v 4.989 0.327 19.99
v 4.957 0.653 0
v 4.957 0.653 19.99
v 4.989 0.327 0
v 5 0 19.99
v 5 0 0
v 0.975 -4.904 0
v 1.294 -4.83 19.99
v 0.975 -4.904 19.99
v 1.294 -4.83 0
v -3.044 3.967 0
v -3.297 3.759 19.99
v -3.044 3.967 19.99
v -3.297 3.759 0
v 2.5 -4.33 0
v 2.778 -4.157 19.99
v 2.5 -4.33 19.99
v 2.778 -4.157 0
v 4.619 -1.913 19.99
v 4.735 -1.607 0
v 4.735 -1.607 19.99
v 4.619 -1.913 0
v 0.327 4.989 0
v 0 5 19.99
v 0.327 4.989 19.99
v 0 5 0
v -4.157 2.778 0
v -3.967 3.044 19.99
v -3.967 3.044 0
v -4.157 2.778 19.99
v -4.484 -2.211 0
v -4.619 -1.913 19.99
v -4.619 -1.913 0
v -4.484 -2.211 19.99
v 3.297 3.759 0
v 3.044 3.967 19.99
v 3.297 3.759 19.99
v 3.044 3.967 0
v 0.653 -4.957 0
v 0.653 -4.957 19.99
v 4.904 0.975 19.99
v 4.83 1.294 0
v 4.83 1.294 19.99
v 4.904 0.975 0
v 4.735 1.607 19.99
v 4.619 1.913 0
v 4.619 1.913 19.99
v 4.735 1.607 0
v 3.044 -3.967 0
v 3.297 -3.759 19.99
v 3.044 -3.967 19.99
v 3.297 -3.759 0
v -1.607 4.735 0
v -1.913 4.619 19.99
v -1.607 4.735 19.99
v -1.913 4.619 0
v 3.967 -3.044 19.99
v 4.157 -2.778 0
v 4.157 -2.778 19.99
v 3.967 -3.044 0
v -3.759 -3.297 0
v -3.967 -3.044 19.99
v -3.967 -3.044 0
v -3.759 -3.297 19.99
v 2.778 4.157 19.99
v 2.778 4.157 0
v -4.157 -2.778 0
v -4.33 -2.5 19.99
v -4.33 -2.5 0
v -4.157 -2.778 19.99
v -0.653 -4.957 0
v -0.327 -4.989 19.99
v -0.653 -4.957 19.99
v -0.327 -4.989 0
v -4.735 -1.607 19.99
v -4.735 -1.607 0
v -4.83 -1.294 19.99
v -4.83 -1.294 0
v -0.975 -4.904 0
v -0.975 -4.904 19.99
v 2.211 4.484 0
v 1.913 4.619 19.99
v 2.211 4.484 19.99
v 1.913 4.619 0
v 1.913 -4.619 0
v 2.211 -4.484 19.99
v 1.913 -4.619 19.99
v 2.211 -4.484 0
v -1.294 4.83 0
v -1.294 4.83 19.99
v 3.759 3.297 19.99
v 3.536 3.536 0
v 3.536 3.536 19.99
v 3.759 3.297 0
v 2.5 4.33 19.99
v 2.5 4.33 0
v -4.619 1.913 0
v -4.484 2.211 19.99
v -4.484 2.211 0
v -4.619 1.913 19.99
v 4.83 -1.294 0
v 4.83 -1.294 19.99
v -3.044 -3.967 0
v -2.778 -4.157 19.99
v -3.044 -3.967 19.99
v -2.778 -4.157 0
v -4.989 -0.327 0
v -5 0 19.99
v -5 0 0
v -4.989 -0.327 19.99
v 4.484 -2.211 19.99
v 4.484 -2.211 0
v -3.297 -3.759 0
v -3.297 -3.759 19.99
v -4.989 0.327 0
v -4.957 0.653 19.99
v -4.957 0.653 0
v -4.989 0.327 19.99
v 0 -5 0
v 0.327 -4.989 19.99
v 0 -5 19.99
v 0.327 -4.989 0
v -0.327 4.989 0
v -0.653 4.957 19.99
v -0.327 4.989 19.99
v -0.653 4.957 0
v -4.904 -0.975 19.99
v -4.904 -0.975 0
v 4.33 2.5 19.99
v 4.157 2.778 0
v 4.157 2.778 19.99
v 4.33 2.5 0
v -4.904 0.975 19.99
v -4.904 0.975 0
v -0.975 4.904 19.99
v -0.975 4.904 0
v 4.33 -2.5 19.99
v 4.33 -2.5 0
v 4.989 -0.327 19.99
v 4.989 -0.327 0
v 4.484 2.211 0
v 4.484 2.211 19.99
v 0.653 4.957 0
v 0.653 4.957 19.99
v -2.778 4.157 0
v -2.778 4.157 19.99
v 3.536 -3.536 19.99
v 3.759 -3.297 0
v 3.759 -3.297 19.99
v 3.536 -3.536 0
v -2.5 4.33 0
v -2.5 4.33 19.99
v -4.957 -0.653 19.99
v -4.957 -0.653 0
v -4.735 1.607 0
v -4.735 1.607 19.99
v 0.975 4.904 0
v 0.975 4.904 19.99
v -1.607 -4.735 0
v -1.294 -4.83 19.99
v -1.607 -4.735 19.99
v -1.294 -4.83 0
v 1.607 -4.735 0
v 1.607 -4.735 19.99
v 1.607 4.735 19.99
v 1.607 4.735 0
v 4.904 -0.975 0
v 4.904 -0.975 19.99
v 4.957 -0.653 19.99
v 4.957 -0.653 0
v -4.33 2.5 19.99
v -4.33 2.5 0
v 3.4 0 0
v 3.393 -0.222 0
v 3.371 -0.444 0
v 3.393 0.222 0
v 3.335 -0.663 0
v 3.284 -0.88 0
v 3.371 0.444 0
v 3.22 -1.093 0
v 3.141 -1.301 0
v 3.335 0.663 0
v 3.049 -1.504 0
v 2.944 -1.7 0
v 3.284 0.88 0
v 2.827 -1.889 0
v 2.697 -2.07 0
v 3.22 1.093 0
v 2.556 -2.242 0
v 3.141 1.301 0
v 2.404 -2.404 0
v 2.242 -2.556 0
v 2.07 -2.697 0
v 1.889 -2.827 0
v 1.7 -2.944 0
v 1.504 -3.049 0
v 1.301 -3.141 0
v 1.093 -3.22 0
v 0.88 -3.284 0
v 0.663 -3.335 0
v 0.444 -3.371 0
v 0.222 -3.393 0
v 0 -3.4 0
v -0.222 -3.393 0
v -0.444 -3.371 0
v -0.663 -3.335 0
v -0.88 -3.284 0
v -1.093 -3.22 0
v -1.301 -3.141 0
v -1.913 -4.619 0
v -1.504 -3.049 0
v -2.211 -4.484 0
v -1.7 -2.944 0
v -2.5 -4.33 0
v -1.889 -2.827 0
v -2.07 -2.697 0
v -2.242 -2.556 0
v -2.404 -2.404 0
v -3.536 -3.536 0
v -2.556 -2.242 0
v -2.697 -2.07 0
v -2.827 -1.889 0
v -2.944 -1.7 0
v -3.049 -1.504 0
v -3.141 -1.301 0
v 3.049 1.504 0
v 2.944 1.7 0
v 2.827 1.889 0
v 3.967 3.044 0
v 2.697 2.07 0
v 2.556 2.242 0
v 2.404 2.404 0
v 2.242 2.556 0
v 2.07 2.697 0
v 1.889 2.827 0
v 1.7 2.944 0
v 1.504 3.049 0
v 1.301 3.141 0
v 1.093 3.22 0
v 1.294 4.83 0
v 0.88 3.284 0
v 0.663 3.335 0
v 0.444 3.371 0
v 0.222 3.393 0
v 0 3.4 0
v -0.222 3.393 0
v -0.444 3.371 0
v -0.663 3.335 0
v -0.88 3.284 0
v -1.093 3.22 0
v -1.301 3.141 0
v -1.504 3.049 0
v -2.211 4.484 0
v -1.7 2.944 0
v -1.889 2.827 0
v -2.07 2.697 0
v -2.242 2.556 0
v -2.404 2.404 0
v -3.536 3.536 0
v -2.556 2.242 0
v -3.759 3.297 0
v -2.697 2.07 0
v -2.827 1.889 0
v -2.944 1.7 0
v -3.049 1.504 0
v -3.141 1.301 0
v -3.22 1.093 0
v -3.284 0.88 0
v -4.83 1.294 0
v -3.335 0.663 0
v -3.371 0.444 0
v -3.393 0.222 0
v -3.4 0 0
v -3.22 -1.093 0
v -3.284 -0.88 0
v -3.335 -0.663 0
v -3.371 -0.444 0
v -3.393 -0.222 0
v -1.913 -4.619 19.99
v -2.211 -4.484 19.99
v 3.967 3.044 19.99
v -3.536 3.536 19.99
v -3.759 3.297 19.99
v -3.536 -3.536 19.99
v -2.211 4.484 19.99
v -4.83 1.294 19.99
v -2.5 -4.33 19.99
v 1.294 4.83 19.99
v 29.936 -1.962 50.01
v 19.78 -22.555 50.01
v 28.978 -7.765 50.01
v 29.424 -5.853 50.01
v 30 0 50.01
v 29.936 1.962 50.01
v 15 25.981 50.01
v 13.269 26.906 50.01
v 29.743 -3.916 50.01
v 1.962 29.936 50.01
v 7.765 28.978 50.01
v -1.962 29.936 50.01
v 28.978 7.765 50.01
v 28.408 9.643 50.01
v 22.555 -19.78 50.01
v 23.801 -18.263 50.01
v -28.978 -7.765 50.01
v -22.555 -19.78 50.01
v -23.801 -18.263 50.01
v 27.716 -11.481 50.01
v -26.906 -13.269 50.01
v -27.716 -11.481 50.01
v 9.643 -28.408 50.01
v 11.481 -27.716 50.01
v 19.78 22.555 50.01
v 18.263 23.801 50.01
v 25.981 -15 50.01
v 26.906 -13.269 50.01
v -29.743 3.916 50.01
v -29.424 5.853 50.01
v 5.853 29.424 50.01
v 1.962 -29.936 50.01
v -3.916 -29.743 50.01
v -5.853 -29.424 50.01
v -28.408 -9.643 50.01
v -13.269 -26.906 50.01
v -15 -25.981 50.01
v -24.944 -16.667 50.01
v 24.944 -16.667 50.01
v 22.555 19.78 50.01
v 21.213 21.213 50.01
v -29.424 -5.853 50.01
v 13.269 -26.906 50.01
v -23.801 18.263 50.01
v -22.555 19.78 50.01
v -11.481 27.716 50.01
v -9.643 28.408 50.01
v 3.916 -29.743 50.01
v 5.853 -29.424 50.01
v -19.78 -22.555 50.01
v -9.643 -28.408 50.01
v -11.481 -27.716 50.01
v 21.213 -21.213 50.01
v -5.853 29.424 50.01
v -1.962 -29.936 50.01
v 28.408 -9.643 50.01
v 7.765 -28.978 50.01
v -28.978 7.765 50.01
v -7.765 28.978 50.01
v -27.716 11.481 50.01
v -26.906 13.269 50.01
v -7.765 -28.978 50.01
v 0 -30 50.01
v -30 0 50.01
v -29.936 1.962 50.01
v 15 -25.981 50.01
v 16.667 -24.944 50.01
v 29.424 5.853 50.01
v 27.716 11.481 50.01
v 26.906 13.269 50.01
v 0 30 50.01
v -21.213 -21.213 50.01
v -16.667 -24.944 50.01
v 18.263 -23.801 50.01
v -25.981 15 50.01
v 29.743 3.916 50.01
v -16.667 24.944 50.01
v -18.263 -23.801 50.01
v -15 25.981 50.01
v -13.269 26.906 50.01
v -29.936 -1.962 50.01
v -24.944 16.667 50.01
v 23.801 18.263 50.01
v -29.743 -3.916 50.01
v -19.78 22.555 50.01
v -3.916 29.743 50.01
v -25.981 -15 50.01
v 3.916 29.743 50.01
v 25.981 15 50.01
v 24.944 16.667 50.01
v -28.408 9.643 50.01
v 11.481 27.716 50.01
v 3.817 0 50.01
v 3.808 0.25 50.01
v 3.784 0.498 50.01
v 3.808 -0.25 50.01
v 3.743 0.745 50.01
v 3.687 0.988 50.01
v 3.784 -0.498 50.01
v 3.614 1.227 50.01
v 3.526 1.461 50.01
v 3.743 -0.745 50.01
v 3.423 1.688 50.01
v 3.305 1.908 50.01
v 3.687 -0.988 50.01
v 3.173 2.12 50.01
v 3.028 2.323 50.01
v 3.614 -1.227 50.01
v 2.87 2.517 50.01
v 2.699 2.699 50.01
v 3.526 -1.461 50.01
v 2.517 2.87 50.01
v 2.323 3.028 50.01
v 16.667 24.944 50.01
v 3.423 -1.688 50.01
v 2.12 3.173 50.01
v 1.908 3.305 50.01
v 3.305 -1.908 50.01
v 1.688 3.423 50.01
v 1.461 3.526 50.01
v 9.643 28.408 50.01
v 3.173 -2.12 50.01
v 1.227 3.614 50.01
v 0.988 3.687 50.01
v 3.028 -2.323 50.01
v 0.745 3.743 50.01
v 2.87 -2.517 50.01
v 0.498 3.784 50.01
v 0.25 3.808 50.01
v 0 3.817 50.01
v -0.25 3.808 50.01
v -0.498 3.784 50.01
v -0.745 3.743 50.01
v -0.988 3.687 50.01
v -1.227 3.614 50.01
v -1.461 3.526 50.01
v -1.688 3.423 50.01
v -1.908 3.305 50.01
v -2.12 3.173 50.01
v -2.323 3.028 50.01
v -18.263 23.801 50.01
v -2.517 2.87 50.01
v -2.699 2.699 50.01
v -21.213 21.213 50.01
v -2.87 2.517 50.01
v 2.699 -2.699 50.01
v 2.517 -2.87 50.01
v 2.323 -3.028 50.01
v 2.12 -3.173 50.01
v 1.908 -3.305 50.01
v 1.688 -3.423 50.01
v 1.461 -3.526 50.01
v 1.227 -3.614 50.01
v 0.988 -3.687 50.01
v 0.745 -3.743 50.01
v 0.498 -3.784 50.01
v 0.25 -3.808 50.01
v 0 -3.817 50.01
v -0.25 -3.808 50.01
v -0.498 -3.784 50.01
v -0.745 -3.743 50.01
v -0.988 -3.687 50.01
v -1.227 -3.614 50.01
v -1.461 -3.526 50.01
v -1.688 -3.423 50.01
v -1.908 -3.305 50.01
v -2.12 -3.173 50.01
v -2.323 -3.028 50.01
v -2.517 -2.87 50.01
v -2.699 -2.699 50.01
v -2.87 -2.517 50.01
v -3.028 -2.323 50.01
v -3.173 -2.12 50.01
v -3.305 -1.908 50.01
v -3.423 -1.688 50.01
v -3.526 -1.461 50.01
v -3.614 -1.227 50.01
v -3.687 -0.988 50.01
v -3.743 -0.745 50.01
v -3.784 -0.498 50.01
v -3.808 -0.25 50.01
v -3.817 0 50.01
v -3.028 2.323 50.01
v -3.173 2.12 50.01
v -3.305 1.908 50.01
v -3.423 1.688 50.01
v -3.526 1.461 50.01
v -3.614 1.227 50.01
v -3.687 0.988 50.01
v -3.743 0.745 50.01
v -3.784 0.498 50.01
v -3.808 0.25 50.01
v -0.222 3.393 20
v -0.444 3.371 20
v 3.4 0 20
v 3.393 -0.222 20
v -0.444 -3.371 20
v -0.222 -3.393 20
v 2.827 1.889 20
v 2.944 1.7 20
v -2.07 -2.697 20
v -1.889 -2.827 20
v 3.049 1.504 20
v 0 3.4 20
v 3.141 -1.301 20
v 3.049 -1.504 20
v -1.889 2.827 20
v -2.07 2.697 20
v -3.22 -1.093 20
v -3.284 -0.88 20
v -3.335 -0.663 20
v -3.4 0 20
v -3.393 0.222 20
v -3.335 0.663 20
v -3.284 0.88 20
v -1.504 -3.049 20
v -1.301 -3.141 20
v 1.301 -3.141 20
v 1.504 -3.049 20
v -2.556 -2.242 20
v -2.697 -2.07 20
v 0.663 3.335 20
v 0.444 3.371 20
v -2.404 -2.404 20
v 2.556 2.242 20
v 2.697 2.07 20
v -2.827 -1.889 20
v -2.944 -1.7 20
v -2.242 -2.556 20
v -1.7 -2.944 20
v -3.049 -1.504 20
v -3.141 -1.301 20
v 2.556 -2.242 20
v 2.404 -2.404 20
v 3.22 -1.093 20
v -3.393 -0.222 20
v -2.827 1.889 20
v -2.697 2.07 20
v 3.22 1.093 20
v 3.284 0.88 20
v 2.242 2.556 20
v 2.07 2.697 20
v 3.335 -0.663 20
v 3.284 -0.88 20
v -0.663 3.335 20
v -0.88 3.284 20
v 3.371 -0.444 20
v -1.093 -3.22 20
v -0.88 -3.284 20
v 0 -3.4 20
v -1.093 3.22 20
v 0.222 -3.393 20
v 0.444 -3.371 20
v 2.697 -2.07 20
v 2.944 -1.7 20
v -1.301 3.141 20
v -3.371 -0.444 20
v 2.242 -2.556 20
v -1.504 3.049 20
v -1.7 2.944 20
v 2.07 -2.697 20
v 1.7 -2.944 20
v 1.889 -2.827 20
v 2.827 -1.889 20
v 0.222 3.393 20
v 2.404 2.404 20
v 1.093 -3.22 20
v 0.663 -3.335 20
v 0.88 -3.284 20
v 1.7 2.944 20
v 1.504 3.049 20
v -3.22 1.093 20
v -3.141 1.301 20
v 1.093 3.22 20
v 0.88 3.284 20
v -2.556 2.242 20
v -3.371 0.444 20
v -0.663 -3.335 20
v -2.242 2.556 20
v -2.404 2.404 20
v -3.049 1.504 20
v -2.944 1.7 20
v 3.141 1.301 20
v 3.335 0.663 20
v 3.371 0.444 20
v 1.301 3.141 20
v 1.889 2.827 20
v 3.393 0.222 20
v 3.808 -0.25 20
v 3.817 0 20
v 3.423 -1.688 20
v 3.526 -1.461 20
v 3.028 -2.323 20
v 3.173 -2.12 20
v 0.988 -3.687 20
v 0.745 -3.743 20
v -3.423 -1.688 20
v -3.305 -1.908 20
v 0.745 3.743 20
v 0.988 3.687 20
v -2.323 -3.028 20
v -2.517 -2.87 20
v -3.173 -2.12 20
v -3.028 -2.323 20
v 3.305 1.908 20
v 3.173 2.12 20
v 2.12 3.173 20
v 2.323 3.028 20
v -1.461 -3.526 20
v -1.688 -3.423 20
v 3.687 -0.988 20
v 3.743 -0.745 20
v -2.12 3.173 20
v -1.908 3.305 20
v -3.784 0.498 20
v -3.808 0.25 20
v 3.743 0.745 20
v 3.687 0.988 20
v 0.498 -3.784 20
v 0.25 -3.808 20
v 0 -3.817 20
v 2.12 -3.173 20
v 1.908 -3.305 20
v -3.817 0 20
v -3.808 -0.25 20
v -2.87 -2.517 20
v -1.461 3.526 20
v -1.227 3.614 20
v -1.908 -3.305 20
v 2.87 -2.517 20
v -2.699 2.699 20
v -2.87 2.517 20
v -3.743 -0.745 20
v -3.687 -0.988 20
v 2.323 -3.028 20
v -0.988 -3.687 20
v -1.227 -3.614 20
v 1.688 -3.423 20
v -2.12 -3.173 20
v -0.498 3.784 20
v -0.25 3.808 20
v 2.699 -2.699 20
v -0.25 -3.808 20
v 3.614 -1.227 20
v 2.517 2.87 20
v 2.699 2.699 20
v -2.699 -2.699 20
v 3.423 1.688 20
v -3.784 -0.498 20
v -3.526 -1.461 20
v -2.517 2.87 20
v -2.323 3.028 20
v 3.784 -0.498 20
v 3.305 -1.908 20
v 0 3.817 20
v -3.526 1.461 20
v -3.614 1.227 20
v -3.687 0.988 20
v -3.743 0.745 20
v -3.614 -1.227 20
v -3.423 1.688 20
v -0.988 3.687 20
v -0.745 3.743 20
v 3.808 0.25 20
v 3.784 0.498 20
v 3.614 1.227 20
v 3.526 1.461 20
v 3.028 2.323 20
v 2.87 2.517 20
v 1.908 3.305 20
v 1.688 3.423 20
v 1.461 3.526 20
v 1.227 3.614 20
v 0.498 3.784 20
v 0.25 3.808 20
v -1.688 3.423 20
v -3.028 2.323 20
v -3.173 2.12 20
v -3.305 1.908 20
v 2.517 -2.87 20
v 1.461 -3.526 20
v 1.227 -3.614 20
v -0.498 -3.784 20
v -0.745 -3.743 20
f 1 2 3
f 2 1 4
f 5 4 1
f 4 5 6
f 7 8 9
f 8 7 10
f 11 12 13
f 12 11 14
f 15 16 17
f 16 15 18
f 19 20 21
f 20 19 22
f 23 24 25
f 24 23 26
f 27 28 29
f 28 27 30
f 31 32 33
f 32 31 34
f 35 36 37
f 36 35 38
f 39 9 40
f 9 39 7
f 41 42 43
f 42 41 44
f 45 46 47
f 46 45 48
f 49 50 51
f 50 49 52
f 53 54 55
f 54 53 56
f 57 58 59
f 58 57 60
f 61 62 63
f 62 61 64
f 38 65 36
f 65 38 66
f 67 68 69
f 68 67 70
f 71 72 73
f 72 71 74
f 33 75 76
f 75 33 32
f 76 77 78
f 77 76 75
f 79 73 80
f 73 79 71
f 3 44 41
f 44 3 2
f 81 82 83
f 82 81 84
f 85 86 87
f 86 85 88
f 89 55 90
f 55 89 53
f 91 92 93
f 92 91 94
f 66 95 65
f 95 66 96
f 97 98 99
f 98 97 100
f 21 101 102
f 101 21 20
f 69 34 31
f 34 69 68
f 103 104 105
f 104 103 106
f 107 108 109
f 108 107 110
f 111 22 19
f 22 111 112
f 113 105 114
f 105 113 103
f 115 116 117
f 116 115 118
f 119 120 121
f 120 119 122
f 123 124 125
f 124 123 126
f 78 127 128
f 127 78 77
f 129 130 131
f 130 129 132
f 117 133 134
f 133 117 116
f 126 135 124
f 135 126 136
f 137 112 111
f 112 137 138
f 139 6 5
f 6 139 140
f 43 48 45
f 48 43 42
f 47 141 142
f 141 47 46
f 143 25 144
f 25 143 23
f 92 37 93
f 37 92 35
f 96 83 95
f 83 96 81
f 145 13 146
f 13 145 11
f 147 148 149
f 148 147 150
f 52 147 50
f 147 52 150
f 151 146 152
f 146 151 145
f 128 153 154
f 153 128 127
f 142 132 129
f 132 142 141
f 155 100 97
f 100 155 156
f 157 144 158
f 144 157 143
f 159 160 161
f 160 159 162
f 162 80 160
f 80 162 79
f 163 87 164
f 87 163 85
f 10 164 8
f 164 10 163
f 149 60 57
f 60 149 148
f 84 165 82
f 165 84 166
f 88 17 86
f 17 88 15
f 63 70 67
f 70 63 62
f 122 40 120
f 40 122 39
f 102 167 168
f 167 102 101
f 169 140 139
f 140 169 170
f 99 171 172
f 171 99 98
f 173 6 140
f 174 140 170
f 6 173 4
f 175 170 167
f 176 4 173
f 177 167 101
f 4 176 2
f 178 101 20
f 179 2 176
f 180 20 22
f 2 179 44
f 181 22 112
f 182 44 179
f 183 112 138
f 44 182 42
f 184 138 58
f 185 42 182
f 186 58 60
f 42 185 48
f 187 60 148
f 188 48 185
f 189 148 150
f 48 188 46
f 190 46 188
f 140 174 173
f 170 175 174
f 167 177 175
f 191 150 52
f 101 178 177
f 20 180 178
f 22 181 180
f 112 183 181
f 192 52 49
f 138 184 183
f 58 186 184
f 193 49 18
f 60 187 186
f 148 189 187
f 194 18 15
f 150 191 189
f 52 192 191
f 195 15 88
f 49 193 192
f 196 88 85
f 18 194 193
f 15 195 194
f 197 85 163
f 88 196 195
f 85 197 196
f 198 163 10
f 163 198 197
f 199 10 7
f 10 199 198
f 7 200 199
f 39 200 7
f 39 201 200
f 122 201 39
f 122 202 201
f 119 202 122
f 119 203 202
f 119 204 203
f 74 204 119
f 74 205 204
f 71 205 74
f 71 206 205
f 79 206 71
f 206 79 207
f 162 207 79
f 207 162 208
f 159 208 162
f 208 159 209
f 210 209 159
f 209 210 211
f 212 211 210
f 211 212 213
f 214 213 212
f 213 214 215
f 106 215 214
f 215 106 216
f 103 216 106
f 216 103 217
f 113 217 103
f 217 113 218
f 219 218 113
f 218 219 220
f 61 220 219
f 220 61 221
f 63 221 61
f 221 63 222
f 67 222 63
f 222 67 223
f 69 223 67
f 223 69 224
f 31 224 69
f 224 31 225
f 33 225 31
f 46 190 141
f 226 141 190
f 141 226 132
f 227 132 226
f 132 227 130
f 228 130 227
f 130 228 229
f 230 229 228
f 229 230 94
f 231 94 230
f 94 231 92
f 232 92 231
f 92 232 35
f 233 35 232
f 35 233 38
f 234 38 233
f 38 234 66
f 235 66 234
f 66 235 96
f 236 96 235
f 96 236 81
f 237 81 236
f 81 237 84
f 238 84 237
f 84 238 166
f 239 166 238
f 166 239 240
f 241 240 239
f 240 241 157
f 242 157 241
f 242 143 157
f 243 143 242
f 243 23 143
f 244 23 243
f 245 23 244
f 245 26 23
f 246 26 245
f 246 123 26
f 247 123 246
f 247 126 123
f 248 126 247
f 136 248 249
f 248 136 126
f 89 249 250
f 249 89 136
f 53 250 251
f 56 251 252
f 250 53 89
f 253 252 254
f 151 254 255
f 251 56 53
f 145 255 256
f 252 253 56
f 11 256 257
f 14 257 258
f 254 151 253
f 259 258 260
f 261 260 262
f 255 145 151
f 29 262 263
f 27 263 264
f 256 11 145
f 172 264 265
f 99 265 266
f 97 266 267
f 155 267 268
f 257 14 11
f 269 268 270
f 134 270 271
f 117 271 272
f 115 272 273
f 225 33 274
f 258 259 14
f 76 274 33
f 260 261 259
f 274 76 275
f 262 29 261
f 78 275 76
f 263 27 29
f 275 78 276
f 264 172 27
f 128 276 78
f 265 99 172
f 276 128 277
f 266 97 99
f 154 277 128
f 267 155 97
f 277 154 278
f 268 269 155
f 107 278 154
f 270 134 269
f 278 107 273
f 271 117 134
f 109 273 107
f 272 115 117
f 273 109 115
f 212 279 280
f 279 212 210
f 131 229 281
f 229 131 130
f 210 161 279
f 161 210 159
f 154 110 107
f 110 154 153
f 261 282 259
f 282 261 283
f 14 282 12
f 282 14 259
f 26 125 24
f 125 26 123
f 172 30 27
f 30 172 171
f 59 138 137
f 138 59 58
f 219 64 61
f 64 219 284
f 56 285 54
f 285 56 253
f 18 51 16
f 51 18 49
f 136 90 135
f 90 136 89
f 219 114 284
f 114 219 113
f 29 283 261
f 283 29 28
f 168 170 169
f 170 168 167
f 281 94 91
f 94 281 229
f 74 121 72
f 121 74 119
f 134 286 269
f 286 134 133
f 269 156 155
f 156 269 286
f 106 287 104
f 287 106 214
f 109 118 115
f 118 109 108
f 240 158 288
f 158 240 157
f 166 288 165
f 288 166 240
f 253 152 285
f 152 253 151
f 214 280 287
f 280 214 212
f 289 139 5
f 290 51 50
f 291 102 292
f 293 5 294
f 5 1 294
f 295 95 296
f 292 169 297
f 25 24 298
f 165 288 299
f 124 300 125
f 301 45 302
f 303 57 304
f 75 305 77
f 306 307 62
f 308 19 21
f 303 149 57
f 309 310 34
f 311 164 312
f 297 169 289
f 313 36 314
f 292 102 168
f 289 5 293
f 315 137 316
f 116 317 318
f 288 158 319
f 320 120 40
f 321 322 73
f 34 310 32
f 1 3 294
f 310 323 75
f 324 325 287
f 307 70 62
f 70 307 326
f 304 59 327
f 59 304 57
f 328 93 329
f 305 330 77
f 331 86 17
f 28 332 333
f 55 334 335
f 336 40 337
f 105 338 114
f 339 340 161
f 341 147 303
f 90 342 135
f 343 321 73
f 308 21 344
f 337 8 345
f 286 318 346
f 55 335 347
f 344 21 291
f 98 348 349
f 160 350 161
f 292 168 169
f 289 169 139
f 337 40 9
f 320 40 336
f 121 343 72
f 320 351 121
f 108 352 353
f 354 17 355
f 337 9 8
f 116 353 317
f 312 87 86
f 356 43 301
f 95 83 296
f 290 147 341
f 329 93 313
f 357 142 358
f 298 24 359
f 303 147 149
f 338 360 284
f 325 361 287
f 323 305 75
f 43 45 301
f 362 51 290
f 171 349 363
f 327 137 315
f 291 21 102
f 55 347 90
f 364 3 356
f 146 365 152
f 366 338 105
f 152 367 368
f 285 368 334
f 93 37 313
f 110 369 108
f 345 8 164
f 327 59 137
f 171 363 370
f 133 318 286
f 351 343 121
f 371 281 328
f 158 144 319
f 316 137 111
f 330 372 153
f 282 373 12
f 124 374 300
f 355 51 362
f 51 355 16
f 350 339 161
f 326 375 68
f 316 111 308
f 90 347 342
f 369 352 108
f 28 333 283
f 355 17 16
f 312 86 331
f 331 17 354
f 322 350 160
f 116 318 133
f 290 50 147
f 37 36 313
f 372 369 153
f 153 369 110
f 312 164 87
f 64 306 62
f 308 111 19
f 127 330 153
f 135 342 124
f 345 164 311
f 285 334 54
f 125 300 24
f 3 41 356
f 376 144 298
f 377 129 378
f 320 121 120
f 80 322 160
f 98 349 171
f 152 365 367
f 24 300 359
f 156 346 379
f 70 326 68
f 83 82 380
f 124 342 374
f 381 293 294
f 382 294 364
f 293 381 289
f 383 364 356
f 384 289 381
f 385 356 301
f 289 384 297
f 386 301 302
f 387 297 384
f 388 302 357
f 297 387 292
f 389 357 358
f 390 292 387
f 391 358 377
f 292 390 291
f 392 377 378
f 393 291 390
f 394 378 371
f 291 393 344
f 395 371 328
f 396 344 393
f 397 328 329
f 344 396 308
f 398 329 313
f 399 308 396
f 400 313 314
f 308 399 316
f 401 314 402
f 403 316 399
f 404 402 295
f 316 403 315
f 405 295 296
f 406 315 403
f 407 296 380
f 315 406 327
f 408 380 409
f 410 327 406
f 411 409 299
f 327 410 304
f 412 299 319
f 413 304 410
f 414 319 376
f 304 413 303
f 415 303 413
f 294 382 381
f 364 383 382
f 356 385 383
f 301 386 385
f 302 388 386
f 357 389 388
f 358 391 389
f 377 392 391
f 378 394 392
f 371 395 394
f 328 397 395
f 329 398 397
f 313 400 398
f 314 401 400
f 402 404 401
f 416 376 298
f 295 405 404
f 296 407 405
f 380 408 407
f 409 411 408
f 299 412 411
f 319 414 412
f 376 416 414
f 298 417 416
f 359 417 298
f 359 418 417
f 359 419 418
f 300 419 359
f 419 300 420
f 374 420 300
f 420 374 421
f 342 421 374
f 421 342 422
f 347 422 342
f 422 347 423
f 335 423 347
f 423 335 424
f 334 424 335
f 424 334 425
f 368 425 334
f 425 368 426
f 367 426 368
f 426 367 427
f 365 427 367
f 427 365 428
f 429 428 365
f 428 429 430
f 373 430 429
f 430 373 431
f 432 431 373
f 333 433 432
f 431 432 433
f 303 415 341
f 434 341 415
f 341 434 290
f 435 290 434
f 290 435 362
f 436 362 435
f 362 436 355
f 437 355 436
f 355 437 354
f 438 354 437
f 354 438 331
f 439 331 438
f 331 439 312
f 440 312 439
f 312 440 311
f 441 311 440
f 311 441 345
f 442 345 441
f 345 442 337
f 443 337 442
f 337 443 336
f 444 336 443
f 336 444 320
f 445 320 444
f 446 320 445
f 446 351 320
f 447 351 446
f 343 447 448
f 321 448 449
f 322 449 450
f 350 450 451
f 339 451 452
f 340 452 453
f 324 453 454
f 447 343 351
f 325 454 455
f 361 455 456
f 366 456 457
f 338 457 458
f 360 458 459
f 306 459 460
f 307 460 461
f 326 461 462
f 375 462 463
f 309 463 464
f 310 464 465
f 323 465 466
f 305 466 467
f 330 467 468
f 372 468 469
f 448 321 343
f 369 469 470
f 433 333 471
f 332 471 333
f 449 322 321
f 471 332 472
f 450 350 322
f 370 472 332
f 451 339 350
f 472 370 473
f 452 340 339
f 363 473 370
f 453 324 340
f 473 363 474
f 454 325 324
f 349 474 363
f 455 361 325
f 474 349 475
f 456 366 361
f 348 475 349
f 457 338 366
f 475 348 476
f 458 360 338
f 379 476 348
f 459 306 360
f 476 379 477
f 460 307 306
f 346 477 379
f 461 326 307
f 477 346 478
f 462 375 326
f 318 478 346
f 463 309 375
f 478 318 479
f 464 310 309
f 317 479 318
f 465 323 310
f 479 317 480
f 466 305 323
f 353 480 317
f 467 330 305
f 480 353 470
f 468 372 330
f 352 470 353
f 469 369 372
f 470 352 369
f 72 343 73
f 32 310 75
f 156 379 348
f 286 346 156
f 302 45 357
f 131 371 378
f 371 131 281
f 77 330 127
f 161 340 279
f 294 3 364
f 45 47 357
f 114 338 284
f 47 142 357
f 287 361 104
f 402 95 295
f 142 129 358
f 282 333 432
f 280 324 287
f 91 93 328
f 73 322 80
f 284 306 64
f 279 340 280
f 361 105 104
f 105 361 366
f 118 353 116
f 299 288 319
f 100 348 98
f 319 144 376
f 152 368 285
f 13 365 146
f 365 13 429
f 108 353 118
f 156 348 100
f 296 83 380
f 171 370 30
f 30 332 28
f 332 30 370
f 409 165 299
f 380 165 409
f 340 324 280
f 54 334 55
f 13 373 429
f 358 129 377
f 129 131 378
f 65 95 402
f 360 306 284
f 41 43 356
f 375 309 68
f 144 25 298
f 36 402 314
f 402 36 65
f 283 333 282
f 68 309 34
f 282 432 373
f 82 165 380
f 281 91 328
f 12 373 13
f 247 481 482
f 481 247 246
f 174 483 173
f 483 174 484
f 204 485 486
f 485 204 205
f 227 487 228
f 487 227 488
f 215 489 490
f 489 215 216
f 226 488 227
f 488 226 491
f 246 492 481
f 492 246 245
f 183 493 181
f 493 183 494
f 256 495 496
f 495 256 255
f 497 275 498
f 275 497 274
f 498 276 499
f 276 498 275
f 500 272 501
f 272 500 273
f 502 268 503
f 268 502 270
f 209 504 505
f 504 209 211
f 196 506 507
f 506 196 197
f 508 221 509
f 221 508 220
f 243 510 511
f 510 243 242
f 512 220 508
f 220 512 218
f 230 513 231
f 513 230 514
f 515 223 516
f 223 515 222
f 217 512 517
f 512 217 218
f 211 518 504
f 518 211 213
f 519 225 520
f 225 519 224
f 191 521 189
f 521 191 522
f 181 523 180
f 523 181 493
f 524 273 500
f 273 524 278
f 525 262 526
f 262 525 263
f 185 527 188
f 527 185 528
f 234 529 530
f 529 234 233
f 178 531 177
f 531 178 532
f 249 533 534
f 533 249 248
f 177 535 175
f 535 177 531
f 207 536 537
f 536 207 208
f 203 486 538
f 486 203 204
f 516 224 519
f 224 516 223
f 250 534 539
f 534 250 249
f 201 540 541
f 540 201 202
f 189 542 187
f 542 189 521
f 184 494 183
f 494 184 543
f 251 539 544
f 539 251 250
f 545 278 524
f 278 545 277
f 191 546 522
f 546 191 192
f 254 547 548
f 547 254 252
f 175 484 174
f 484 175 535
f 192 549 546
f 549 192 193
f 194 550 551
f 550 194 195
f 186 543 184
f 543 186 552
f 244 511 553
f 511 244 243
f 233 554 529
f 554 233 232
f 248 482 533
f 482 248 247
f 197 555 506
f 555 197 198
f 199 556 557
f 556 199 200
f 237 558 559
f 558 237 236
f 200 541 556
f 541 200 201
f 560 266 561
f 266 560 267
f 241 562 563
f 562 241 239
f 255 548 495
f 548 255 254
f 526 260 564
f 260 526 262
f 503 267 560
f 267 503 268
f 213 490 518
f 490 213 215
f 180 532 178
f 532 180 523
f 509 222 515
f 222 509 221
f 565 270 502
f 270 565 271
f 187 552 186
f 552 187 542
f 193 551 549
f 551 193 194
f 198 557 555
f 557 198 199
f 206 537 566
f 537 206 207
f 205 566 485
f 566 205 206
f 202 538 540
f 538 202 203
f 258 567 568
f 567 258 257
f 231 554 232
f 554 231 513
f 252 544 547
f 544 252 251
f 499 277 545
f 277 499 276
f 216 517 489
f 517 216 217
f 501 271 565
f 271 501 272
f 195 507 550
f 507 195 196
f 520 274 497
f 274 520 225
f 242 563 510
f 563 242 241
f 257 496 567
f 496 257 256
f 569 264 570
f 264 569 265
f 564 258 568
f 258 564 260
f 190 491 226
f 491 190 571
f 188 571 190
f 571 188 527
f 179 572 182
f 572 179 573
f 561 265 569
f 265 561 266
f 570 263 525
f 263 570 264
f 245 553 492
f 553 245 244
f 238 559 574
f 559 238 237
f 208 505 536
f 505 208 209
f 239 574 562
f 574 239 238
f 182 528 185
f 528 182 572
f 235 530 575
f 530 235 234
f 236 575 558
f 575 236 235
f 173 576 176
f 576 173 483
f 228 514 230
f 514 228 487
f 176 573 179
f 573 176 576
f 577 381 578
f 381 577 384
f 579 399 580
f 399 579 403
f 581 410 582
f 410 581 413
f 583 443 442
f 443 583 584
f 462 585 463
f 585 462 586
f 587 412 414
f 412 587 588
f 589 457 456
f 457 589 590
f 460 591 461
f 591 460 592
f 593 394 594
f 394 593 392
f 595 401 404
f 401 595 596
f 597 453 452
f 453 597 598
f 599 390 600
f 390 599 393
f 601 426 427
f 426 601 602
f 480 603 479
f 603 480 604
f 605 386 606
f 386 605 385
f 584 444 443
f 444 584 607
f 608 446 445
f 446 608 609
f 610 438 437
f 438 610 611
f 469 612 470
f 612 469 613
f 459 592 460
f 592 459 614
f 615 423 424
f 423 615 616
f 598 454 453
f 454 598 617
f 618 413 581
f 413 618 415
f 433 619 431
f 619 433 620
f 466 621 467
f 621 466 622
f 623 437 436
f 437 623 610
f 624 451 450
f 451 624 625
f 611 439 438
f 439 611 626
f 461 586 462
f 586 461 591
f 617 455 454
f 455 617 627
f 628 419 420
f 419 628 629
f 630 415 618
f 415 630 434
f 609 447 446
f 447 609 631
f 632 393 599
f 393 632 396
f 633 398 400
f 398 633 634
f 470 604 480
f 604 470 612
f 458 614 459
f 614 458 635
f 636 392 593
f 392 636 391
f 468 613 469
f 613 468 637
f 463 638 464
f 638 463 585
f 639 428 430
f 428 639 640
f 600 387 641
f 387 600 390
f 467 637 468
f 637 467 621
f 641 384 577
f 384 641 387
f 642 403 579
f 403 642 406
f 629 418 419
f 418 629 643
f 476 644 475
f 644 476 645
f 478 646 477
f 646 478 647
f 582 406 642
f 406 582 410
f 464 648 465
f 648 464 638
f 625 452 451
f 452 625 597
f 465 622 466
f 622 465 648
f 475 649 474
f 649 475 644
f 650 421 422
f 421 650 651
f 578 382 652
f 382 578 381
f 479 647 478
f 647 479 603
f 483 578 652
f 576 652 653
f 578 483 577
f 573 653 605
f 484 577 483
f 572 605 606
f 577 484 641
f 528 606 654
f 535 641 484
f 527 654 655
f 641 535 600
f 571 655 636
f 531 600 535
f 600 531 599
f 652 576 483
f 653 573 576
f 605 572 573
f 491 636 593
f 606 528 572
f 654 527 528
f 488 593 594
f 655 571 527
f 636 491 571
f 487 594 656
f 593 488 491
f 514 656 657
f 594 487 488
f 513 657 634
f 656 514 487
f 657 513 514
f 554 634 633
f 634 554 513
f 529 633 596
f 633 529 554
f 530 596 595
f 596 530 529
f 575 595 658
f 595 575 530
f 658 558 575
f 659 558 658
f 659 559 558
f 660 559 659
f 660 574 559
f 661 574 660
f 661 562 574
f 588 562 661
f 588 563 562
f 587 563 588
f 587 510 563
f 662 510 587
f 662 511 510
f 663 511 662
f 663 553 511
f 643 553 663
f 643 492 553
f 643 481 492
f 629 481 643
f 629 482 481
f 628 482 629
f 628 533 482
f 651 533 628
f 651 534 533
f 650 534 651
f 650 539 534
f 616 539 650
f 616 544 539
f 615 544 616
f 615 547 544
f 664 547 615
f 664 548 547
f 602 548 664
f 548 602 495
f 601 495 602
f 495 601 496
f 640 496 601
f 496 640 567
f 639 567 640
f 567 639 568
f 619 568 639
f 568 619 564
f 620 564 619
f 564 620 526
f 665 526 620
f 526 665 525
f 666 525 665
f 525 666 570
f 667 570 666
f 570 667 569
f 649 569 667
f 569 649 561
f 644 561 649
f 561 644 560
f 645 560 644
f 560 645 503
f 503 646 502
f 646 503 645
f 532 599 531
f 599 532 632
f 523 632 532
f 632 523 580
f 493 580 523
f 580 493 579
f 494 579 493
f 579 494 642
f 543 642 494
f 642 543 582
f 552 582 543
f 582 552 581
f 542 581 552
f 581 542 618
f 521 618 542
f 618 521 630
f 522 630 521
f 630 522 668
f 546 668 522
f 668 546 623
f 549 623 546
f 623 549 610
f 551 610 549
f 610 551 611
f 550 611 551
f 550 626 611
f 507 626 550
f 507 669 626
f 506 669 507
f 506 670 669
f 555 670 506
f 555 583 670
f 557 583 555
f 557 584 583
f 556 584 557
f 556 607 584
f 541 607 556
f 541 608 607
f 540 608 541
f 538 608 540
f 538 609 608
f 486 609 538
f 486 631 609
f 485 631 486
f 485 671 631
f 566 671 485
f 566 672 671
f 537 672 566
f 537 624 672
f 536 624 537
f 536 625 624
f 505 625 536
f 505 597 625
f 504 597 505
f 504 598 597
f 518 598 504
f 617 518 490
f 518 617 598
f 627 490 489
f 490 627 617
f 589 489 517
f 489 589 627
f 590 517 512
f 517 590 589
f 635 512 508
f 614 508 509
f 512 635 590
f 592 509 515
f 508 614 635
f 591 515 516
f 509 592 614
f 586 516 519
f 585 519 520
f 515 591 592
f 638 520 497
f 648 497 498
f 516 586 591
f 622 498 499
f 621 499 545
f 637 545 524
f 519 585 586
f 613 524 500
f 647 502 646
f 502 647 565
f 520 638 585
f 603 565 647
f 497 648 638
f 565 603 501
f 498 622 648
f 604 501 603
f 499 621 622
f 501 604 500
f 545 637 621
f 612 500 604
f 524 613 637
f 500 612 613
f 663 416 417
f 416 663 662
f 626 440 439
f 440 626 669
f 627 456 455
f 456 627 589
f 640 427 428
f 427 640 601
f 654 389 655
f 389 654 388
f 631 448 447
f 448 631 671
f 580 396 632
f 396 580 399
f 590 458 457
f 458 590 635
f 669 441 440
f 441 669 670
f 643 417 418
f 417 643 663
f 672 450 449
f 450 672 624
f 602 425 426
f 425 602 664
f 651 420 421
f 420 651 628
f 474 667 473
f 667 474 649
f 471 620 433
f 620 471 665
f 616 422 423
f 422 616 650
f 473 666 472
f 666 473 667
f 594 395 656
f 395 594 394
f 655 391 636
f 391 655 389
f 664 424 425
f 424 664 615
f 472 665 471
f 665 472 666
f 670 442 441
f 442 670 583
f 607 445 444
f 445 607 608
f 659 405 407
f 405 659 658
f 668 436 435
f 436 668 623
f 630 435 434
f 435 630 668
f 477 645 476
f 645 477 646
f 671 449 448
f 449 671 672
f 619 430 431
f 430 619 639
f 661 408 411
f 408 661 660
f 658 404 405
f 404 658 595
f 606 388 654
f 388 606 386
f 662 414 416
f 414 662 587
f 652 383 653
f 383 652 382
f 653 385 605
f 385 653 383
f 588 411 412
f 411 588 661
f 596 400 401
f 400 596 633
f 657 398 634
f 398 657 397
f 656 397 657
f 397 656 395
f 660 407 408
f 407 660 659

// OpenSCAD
// Funnel - printed upright, open top and bottom
// Units: mm

// ---- Spout ----
spout_od   = 10;    // spout outer diameter
spout_id   = spout_od - 2 * 1.6;  // spout bore (6.8)
spout_len  = 20;    // spout length (z = 0 to 20)

// ---- Cone ----
cone_d0    = 10;    // cone outer diameter at z = spout_len
cone_d1    = 60;    // cone outer diameter at rim (z = 50)
cone_h     = 30;    // cone height (50 - 20)

// ---- Common ----
wall       = 1.6;   // wall thickness
eps        = 0.5;   // cutter overshoot past faces
$fn        = 96;    // curve resolution

// Derived
rim_z      = spout_len + cone_h;   // 50
cone_dz    = cone_d1 - cone_d0;    // 50

difference() {
    union() {
        // Spout
        cylinder(h = spout_len, d = spout_od);
        // Cone (slightly overlapping the spout for a clean union)
        translate([0, 0, spout_len - 0.01])
            cylinder(h = cone_h + 0.02, d1 = cone_d0, d2 = cone_d1);
    }
    // Through-bore: spout bore extended above and below,
    // then tapered so the bore opens to the rim diameter at the top
    translate([0, 0, -eps])
        linear_extrude(len = spout_len + 2 * eps)
            circle(d = spout_id);
    translate([0, 0, spout_len])
        linear_extrude(len = cone_h + 2 * eps)
            circle(d = spout_id + eps * cone_dz / cone_h);
}
